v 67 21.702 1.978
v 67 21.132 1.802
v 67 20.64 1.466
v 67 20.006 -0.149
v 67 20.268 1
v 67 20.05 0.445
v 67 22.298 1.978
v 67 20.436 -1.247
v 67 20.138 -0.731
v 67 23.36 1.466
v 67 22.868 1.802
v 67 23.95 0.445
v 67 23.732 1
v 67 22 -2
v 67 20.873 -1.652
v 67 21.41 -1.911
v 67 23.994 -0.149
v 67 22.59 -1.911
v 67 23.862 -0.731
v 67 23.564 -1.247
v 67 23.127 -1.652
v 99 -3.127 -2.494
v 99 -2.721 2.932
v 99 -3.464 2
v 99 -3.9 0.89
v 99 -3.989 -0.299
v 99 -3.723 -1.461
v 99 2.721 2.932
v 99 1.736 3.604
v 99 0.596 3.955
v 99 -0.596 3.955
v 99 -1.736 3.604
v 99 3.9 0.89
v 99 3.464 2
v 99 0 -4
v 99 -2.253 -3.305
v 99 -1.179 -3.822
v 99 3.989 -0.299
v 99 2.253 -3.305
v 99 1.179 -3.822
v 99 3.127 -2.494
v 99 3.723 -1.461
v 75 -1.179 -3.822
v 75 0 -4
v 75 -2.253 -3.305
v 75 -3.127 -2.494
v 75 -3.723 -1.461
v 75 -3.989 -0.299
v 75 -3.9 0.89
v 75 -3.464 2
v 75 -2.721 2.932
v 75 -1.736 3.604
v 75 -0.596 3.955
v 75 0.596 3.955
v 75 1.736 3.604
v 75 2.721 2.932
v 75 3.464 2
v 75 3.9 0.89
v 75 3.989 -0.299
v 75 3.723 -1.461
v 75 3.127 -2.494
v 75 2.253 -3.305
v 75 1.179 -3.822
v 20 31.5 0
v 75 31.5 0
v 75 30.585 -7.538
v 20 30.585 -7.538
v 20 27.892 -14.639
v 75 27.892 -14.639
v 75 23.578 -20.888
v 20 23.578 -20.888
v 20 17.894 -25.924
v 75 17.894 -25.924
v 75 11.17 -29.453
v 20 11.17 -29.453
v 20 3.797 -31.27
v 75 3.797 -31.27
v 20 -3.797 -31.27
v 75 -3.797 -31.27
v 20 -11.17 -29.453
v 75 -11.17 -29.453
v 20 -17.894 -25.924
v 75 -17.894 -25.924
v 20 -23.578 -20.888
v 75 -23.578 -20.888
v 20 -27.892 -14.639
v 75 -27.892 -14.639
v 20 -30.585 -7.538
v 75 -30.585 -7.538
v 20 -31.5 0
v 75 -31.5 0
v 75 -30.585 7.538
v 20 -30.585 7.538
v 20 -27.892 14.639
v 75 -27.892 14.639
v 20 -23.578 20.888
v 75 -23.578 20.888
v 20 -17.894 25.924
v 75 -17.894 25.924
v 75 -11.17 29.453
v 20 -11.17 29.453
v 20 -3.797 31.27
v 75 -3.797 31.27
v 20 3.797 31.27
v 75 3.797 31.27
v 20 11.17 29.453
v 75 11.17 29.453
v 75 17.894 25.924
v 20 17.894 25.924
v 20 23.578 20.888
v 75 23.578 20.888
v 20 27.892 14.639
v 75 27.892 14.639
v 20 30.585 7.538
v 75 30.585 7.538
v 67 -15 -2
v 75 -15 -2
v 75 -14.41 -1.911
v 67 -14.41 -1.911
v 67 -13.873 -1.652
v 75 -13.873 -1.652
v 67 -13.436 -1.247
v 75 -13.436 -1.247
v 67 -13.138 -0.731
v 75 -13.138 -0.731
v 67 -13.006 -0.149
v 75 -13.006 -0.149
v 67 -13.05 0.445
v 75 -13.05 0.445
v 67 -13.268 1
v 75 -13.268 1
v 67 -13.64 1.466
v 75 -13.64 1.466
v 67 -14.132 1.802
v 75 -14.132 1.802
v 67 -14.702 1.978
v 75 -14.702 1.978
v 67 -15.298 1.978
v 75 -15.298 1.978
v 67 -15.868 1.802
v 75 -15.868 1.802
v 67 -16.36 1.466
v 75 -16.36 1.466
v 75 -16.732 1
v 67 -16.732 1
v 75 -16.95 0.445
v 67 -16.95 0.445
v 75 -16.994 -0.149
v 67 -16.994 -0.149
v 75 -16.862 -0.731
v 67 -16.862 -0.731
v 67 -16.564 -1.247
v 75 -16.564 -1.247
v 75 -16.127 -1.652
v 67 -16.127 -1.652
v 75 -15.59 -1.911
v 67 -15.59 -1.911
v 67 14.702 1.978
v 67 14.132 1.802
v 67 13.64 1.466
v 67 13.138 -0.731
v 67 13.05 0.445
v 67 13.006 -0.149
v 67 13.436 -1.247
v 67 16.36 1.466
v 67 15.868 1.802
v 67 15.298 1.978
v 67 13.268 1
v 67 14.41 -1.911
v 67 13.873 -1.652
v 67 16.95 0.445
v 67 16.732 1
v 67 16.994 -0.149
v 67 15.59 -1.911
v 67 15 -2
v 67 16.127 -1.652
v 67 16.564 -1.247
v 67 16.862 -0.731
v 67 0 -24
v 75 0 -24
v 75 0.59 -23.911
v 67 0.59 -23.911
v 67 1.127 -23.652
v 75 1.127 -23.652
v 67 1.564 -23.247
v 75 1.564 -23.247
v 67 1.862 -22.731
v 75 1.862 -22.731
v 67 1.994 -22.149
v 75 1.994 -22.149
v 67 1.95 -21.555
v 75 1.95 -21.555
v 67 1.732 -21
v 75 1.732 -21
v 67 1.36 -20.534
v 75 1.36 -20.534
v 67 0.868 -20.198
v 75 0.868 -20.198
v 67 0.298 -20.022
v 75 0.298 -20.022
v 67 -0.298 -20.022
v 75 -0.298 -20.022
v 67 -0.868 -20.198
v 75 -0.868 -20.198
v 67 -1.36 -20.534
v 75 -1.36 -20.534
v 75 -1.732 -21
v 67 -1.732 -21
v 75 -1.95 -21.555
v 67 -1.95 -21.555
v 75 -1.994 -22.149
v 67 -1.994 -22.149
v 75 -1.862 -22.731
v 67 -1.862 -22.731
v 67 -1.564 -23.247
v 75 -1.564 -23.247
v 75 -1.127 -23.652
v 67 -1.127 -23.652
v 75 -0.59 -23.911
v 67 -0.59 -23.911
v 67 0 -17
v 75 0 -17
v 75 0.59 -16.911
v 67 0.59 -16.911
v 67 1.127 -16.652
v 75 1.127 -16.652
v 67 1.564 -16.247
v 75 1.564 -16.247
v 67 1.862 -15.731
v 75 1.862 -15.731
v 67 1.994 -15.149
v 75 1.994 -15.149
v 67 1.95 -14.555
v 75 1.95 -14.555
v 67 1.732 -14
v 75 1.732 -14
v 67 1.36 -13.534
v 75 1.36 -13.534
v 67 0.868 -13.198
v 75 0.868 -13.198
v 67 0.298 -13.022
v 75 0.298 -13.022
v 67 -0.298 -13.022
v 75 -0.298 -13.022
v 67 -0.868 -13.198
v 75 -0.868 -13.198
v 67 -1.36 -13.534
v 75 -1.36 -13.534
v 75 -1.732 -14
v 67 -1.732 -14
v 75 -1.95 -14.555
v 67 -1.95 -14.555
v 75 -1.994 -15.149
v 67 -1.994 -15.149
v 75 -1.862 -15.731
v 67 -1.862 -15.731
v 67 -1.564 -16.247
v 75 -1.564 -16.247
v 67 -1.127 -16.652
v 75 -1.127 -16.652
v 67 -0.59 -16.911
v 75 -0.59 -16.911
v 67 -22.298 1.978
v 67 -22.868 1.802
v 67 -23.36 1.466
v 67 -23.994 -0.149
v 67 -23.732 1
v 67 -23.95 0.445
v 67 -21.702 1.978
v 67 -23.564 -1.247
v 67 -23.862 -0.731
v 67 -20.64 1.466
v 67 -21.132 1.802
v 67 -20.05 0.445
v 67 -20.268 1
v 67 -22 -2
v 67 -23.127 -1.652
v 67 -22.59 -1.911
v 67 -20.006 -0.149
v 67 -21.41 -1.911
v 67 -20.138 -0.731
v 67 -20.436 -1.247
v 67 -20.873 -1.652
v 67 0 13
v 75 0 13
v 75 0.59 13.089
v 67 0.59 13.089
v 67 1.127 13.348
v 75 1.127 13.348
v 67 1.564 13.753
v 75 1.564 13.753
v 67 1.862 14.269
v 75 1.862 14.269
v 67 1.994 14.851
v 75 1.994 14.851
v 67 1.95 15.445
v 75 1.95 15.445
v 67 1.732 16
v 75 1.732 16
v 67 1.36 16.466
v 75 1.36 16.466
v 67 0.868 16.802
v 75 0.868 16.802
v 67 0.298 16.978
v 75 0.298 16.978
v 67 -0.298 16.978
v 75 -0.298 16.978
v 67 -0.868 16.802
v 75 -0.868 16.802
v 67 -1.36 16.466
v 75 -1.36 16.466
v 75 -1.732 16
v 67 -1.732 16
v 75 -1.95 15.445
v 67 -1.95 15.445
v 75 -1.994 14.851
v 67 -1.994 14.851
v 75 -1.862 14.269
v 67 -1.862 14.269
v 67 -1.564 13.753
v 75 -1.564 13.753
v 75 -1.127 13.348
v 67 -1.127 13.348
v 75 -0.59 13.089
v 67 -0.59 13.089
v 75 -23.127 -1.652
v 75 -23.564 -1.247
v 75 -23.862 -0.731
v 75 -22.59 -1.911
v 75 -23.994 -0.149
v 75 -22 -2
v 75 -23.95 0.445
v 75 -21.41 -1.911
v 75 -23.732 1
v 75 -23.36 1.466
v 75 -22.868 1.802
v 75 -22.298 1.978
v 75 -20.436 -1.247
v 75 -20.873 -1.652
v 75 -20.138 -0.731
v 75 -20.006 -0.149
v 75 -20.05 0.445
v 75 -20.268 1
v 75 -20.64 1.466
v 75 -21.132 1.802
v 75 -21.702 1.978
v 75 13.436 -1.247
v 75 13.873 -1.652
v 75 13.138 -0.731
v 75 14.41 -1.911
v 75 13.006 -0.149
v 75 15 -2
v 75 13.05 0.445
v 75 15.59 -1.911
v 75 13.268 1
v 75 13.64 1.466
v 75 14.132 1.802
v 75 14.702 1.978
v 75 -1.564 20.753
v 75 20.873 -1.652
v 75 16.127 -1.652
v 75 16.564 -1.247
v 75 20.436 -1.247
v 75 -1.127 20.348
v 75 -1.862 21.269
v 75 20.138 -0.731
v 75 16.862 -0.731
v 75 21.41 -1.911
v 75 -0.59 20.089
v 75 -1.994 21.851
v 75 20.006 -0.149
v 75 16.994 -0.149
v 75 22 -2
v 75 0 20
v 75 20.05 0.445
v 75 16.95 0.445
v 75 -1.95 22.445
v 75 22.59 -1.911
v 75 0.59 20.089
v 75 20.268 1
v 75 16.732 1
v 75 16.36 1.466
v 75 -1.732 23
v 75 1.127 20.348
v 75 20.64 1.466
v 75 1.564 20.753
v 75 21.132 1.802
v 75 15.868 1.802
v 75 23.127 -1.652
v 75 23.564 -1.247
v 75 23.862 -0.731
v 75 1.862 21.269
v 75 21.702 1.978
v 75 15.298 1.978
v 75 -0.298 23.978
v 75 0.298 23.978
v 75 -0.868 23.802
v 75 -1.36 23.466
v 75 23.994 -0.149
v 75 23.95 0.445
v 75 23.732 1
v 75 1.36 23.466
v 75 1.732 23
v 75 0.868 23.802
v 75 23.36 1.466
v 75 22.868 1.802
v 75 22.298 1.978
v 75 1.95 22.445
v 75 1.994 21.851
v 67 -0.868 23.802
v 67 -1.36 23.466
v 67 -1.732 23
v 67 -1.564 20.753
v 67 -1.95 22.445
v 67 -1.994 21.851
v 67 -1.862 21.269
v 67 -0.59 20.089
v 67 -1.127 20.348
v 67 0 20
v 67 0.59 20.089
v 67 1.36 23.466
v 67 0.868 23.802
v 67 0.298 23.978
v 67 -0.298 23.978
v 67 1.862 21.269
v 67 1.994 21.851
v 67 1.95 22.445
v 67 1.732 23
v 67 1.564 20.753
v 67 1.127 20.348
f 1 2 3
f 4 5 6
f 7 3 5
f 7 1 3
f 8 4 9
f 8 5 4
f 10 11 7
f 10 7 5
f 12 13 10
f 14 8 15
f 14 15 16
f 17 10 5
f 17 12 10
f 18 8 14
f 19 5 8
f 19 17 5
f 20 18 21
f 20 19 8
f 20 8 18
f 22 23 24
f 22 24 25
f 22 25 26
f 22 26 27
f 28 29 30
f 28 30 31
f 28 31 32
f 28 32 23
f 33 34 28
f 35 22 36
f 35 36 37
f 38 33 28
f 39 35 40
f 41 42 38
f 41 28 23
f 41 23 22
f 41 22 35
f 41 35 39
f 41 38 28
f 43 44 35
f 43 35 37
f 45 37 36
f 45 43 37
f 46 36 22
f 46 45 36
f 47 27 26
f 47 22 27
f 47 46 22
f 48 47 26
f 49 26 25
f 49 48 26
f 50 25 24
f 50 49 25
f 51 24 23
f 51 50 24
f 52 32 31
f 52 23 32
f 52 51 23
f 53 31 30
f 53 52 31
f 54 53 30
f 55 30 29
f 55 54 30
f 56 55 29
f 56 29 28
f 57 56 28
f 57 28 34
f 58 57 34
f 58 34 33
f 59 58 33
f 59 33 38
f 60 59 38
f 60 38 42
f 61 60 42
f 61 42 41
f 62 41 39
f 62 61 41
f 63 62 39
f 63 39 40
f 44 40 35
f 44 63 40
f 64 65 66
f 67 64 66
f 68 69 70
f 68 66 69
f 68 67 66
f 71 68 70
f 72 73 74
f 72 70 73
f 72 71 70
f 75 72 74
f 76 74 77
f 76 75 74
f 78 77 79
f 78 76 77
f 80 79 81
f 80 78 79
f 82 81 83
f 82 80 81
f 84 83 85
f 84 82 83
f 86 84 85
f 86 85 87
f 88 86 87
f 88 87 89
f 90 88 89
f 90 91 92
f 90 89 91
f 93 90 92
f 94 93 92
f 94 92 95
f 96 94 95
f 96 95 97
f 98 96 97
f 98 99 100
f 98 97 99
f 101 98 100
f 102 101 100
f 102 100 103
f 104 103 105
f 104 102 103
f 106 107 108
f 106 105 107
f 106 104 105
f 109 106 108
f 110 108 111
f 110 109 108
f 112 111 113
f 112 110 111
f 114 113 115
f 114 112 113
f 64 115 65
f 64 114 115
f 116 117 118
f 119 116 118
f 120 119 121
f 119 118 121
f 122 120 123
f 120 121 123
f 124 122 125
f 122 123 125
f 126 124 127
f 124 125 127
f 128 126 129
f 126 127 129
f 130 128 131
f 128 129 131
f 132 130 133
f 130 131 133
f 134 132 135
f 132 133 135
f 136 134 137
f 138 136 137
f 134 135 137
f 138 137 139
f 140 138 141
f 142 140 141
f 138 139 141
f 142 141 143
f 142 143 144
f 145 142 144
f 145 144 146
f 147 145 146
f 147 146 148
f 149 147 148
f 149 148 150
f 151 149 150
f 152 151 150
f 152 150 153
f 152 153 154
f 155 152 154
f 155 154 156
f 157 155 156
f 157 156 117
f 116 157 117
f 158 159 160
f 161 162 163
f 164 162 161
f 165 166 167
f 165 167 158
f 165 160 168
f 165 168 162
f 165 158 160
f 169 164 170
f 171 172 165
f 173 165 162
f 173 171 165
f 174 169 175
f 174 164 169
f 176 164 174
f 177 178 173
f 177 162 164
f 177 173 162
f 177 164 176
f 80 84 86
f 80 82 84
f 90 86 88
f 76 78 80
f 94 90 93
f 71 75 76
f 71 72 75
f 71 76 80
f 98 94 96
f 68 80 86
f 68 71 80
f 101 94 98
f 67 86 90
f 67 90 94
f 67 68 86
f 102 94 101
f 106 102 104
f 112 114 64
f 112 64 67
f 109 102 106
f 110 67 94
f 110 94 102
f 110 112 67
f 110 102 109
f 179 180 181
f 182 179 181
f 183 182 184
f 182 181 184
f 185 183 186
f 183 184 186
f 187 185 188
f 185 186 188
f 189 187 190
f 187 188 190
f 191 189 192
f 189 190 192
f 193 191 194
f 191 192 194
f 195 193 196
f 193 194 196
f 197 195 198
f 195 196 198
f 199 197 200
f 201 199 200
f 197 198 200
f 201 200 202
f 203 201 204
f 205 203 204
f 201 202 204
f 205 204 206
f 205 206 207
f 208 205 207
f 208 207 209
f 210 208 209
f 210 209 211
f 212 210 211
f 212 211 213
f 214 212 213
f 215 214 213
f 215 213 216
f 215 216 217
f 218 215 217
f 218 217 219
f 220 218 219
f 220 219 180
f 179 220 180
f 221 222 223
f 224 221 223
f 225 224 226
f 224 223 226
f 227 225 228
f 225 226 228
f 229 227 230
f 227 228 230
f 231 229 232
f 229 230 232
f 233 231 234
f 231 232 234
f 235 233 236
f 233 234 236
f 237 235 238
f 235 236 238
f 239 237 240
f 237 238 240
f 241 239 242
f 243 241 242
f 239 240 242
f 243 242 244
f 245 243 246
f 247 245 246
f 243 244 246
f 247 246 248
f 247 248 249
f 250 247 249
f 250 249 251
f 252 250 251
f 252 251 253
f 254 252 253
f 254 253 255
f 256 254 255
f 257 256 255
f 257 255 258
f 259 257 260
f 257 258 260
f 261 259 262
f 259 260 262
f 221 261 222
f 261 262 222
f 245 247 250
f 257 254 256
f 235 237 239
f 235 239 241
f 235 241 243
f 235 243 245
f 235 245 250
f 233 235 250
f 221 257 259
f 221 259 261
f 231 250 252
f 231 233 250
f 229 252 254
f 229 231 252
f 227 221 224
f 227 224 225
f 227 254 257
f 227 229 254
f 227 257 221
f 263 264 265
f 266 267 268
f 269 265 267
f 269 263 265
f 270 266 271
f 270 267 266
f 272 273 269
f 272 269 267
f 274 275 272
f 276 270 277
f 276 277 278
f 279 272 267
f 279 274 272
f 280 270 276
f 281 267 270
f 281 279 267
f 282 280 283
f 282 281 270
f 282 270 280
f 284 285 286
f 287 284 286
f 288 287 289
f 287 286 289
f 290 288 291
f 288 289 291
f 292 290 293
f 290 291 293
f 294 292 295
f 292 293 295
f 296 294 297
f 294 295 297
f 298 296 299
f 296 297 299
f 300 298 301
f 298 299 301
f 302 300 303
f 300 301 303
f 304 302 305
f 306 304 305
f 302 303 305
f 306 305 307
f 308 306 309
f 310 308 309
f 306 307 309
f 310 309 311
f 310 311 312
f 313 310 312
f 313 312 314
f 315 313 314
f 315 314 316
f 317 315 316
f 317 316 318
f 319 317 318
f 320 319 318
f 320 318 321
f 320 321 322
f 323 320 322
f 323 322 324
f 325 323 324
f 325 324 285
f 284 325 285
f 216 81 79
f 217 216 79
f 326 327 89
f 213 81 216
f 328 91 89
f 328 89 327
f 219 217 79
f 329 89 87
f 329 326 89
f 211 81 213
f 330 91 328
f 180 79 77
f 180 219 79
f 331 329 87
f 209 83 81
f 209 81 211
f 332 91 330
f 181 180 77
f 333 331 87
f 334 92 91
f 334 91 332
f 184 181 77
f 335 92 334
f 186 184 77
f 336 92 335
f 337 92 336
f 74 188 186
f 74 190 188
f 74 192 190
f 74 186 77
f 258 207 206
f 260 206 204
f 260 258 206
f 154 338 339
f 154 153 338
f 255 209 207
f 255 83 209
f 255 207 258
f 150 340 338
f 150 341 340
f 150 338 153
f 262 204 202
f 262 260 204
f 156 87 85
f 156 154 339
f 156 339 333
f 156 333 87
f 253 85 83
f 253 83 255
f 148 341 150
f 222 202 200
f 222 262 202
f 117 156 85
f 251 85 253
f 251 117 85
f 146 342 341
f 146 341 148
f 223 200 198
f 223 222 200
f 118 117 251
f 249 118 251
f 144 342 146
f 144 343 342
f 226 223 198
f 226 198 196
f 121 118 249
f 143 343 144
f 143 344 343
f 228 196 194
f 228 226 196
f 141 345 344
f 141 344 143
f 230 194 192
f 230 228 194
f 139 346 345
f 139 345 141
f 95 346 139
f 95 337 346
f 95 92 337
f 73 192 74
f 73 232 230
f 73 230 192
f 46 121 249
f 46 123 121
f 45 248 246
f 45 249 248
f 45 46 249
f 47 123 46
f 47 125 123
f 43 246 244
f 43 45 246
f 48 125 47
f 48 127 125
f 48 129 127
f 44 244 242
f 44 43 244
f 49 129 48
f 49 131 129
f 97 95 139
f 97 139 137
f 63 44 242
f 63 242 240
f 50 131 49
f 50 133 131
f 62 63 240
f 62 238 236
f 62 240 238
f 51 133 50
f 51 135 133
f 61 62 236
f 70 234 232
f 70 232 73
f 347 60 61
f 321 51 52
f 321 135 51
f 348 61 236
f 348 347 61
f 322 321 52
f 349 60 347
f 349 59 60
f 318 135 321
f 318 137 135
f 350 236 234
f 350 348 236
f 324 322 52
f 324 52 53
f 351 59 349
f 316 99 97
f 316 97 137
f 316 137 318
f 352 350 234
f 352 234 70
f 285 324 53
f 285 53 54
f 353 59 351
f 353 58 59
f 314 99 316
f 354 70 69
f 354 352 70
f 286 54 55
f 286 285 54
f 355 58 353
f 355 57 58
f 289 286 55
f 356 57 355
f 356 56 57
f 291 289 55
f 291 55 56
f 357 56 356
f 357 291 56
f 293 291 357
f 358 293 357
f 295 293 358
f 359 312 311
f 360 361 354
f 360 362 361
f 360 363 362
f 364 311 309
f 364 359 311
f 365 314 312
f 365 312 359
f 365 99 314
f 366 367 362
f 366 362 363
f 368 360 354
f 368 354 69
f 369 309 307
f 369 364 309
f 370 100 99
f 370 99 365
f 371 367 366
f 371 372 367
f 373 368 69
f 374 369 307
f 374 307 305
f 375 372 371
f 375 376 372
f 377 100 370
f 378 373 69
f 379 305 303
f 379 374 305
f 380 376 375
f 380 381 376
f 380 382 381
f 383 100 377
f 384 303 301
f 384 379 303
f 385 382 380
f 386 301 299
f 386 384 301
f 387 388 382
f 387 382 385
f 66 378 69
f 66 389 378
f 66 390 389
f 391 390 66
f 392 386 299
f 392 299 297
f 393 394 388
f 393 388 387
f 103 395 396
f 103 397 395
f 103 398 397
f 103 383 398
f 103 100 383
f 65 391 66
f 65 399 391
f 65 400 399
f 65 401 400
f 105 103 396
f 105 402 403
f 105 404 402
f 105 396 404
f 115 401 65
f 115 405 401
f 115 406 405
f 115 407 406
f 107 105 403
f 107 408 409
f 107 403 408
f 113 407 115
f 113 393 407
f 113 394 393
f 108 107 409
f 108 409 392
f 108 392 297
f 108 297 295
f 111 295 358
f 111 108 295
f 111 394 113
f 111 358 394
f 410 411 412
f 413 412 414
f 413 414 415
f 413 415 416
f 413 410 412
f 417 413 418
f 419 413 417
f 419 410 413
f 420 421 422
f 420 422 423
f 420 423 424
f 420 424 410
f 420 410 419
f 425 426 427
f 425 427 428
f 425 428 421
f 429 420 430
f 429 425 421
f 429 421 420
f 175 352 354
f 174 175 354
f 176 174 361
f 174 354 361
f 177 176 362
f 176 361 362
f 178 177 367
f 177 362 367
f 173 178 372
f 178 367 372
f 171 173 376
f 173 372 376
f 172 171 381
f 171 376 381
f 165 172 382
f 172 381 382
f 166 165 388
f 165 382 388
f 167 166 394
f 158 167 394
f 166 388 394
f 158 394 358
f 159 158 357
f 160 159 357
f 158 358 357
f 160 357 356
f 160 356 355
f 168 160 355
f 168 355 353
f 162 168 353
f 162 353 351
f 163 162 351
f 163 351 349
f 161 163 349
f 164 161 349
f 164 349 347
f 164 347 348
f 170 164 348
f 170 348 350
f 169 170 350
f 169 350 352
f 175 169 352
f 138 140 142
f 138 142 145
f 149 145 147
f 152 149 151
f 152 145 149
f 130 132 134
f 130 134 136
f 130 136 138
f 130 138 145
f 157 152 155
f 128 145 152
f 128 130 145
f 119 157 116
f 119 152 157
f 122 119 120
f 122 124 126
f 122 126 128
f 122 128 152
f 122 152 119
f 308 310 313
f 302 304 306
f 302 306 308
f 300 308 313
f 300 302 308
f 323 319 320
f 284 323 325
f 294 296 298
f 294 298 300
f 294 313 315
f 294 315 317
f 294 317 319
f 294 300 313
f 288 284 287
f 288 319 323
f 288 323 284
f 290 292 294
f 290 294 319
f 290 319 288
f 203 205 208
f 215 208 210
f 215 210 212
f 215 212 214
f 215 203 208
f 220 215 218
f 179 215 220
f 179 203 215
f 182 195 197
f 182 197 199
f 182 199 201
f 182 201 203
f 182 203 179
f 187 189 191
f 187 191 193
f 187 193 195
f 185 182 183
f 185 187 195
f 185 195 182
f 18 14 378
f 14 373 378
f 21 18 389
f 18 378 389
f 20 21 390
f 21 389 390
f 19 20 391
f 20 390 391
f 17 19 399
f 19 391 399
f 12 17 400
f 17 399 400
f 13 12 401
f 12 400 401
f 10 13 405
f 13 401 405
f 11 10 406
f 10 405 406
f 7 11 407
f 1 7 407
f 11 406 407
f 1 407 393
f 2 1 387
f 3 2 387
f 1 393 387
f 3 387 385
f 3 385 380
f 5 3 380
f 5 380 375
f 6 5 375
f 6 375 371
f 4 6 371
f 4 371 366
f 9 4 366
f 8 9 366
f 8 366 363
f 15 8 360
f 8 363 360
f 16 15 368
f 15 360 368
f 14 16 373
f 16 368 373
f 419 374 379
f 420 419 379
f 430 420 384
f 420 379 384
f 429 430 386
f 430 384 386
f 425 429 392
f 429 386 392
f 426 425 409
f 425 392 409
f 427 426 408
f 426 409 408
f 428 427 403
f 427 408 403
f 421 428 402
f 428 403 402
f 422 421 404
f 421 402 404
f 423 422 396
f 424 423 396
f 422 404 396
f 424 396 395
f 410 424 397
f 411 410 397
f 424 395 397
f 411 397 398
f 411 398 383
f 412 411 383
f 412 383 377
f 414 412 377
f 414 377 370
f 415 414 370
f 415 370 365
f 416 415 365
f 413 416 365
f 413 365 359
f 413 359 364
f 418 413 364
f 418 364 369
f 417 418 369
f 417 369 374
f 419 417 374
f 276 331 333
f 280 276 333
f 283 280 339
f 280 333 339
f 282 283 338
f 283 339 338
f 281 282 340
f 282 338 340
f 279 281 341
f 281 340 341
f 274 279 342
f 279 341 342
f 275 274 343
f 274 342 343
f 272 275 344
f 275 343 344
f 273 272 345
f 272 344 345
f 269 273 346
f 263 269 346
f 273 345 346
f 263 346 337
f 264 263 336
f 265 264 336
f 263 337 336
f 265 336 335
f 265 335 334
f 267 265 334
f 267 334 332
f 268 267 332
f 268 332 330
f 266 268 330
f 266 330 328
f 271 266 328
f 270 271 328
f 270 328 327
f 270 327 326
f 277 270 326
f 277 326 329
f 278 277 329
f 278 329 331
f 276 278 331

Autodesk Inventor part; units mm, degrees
ref_plane "YZ Plane" through (0, 0, 0) normal (1, 0, 0) x (0, 1, 0)
ref_plane "XZ Plane" through (0, 0, 0) normal (0, 1, 0) x (-1, 0, 0)
ref_plane "XY Plane" through (0, 0, 0) normal (0, 0, 1) x (1, 0, 0)
sketch "Sketch1" plane through (0, 0, 0) normal (1, 0, 0) x (0, 1, 0)
  circle A0 centre (0, 0) radius 31.5
  dimension "d0" = 63
extrude "Extrusion1" add sketch "Sketch1" along normal blind 75
sketch "Sketch2" plane through (75, 0, 0) normal (1, 0, 0) x (0, 0, -1)
  circle A0 centre (0, 0) radius 4
  dimension "d3" = 8
extrude "Extrusion2" add sketch "Sketch2" along normal blind 24
sketch "Sketch3" plane through (75, 0, 0) normal (1, 0, 0) x (0, 0, -1)
  circle A0 centre (0, 15) radius 2
  circle A1 centre (0, 22) radius 2
  circle A2 centre (15, 0) radius 2
  circle A3 centre (22, 0) radius 2
  circle A4 centre (0, -15) radius 2
  circle A5 centre (0, -22) radius 2
  circle A6 centre (-15, 0) radius 2
  circle A7 centre (-22, 0) radius 2
  point P0 (0, 0)
  dimension "d8" = 4
  dimension "d9" = 4
  dimension "d10" = 4
  dimension "d11" = 4
  dimension "d12" = 4
  dimension "d13" = 4
  dimension "d14" = 4
  dimension "d15" = 4
extrude "Extrusion3" cut sketch "Sketch3" against normal blind 8
sketch "Sketch4" plane through (0, 0, 0) normal (-1, 0, 0) x (0, 0, 1)
  circle A0 centre (0, 0) radius 4 projected
  circle A1 centre (0, 0) radius 31.5
extrude "Extrusion4" cut sketch "Sketch4" against normal blind 20 contours A0 | A1
sketch "Sketch5" plane through (75, 0, 0) normal (1, 0, 0) x (0, 0, -1)
  arc A0 (22.2739, -22.2739) -> (-22.2739, -22.2739) centre (0, 0) ccw
  arc A1 (17.3205, -10) -> (-17.3205, -10) centre (0, 0) ccw
  arc A2 (11.2583, -6.5) -> (-11.2583, -6.5) centre (0, 0) ccw
  arc A3 (14.7224, -8.5) -> (-14.7224, -8.5) centre (0, 0) ccw
  arc A4 (20.7846, -12) -> (-20.7846, -12) centre (0, 0) ccw
  line L0 (0, 0) -> (31.5, 0) construction
  arc A5 (-20.7846, -12) -> (-17.3205, -10) centre (-19.0526, -11) ccw
  arc A6 (-14.7224, -8.5) -> (-11.2583, -6.5) centre (-12.9904, -7.5) ccw
  arc A7 (11.2583, -6.5) -> (14.7224, -8.5) centre (12.9904, -7.5) ccw
  arc A8 (17.3205, -10) -> (20.7846, -12) centre (19.0526, -11) ccw
  line L1 (0, 0) -> (31.5, 0) construction
  line L2 (0, 0) -> (-2.8284, -2.8284)
  line L3 (-9.1924, -9.1924) -> (-22.2739, -22.2739)
  line L4 (9.1924, -9.1924) -> (22.2739, -22.2739)
  arc A9 (-9.1924, -9.1924) -> (9.1924, -9.1924) centre (0, 0) ccw
  arc A10 (11.2583, -6.5) -> (-11.2583, -6.5) centre (0, 0) ccw
  circle A11 centre (0, 0) radius 5
  dimension "d23" = 10
properties part number "MotorModel"
